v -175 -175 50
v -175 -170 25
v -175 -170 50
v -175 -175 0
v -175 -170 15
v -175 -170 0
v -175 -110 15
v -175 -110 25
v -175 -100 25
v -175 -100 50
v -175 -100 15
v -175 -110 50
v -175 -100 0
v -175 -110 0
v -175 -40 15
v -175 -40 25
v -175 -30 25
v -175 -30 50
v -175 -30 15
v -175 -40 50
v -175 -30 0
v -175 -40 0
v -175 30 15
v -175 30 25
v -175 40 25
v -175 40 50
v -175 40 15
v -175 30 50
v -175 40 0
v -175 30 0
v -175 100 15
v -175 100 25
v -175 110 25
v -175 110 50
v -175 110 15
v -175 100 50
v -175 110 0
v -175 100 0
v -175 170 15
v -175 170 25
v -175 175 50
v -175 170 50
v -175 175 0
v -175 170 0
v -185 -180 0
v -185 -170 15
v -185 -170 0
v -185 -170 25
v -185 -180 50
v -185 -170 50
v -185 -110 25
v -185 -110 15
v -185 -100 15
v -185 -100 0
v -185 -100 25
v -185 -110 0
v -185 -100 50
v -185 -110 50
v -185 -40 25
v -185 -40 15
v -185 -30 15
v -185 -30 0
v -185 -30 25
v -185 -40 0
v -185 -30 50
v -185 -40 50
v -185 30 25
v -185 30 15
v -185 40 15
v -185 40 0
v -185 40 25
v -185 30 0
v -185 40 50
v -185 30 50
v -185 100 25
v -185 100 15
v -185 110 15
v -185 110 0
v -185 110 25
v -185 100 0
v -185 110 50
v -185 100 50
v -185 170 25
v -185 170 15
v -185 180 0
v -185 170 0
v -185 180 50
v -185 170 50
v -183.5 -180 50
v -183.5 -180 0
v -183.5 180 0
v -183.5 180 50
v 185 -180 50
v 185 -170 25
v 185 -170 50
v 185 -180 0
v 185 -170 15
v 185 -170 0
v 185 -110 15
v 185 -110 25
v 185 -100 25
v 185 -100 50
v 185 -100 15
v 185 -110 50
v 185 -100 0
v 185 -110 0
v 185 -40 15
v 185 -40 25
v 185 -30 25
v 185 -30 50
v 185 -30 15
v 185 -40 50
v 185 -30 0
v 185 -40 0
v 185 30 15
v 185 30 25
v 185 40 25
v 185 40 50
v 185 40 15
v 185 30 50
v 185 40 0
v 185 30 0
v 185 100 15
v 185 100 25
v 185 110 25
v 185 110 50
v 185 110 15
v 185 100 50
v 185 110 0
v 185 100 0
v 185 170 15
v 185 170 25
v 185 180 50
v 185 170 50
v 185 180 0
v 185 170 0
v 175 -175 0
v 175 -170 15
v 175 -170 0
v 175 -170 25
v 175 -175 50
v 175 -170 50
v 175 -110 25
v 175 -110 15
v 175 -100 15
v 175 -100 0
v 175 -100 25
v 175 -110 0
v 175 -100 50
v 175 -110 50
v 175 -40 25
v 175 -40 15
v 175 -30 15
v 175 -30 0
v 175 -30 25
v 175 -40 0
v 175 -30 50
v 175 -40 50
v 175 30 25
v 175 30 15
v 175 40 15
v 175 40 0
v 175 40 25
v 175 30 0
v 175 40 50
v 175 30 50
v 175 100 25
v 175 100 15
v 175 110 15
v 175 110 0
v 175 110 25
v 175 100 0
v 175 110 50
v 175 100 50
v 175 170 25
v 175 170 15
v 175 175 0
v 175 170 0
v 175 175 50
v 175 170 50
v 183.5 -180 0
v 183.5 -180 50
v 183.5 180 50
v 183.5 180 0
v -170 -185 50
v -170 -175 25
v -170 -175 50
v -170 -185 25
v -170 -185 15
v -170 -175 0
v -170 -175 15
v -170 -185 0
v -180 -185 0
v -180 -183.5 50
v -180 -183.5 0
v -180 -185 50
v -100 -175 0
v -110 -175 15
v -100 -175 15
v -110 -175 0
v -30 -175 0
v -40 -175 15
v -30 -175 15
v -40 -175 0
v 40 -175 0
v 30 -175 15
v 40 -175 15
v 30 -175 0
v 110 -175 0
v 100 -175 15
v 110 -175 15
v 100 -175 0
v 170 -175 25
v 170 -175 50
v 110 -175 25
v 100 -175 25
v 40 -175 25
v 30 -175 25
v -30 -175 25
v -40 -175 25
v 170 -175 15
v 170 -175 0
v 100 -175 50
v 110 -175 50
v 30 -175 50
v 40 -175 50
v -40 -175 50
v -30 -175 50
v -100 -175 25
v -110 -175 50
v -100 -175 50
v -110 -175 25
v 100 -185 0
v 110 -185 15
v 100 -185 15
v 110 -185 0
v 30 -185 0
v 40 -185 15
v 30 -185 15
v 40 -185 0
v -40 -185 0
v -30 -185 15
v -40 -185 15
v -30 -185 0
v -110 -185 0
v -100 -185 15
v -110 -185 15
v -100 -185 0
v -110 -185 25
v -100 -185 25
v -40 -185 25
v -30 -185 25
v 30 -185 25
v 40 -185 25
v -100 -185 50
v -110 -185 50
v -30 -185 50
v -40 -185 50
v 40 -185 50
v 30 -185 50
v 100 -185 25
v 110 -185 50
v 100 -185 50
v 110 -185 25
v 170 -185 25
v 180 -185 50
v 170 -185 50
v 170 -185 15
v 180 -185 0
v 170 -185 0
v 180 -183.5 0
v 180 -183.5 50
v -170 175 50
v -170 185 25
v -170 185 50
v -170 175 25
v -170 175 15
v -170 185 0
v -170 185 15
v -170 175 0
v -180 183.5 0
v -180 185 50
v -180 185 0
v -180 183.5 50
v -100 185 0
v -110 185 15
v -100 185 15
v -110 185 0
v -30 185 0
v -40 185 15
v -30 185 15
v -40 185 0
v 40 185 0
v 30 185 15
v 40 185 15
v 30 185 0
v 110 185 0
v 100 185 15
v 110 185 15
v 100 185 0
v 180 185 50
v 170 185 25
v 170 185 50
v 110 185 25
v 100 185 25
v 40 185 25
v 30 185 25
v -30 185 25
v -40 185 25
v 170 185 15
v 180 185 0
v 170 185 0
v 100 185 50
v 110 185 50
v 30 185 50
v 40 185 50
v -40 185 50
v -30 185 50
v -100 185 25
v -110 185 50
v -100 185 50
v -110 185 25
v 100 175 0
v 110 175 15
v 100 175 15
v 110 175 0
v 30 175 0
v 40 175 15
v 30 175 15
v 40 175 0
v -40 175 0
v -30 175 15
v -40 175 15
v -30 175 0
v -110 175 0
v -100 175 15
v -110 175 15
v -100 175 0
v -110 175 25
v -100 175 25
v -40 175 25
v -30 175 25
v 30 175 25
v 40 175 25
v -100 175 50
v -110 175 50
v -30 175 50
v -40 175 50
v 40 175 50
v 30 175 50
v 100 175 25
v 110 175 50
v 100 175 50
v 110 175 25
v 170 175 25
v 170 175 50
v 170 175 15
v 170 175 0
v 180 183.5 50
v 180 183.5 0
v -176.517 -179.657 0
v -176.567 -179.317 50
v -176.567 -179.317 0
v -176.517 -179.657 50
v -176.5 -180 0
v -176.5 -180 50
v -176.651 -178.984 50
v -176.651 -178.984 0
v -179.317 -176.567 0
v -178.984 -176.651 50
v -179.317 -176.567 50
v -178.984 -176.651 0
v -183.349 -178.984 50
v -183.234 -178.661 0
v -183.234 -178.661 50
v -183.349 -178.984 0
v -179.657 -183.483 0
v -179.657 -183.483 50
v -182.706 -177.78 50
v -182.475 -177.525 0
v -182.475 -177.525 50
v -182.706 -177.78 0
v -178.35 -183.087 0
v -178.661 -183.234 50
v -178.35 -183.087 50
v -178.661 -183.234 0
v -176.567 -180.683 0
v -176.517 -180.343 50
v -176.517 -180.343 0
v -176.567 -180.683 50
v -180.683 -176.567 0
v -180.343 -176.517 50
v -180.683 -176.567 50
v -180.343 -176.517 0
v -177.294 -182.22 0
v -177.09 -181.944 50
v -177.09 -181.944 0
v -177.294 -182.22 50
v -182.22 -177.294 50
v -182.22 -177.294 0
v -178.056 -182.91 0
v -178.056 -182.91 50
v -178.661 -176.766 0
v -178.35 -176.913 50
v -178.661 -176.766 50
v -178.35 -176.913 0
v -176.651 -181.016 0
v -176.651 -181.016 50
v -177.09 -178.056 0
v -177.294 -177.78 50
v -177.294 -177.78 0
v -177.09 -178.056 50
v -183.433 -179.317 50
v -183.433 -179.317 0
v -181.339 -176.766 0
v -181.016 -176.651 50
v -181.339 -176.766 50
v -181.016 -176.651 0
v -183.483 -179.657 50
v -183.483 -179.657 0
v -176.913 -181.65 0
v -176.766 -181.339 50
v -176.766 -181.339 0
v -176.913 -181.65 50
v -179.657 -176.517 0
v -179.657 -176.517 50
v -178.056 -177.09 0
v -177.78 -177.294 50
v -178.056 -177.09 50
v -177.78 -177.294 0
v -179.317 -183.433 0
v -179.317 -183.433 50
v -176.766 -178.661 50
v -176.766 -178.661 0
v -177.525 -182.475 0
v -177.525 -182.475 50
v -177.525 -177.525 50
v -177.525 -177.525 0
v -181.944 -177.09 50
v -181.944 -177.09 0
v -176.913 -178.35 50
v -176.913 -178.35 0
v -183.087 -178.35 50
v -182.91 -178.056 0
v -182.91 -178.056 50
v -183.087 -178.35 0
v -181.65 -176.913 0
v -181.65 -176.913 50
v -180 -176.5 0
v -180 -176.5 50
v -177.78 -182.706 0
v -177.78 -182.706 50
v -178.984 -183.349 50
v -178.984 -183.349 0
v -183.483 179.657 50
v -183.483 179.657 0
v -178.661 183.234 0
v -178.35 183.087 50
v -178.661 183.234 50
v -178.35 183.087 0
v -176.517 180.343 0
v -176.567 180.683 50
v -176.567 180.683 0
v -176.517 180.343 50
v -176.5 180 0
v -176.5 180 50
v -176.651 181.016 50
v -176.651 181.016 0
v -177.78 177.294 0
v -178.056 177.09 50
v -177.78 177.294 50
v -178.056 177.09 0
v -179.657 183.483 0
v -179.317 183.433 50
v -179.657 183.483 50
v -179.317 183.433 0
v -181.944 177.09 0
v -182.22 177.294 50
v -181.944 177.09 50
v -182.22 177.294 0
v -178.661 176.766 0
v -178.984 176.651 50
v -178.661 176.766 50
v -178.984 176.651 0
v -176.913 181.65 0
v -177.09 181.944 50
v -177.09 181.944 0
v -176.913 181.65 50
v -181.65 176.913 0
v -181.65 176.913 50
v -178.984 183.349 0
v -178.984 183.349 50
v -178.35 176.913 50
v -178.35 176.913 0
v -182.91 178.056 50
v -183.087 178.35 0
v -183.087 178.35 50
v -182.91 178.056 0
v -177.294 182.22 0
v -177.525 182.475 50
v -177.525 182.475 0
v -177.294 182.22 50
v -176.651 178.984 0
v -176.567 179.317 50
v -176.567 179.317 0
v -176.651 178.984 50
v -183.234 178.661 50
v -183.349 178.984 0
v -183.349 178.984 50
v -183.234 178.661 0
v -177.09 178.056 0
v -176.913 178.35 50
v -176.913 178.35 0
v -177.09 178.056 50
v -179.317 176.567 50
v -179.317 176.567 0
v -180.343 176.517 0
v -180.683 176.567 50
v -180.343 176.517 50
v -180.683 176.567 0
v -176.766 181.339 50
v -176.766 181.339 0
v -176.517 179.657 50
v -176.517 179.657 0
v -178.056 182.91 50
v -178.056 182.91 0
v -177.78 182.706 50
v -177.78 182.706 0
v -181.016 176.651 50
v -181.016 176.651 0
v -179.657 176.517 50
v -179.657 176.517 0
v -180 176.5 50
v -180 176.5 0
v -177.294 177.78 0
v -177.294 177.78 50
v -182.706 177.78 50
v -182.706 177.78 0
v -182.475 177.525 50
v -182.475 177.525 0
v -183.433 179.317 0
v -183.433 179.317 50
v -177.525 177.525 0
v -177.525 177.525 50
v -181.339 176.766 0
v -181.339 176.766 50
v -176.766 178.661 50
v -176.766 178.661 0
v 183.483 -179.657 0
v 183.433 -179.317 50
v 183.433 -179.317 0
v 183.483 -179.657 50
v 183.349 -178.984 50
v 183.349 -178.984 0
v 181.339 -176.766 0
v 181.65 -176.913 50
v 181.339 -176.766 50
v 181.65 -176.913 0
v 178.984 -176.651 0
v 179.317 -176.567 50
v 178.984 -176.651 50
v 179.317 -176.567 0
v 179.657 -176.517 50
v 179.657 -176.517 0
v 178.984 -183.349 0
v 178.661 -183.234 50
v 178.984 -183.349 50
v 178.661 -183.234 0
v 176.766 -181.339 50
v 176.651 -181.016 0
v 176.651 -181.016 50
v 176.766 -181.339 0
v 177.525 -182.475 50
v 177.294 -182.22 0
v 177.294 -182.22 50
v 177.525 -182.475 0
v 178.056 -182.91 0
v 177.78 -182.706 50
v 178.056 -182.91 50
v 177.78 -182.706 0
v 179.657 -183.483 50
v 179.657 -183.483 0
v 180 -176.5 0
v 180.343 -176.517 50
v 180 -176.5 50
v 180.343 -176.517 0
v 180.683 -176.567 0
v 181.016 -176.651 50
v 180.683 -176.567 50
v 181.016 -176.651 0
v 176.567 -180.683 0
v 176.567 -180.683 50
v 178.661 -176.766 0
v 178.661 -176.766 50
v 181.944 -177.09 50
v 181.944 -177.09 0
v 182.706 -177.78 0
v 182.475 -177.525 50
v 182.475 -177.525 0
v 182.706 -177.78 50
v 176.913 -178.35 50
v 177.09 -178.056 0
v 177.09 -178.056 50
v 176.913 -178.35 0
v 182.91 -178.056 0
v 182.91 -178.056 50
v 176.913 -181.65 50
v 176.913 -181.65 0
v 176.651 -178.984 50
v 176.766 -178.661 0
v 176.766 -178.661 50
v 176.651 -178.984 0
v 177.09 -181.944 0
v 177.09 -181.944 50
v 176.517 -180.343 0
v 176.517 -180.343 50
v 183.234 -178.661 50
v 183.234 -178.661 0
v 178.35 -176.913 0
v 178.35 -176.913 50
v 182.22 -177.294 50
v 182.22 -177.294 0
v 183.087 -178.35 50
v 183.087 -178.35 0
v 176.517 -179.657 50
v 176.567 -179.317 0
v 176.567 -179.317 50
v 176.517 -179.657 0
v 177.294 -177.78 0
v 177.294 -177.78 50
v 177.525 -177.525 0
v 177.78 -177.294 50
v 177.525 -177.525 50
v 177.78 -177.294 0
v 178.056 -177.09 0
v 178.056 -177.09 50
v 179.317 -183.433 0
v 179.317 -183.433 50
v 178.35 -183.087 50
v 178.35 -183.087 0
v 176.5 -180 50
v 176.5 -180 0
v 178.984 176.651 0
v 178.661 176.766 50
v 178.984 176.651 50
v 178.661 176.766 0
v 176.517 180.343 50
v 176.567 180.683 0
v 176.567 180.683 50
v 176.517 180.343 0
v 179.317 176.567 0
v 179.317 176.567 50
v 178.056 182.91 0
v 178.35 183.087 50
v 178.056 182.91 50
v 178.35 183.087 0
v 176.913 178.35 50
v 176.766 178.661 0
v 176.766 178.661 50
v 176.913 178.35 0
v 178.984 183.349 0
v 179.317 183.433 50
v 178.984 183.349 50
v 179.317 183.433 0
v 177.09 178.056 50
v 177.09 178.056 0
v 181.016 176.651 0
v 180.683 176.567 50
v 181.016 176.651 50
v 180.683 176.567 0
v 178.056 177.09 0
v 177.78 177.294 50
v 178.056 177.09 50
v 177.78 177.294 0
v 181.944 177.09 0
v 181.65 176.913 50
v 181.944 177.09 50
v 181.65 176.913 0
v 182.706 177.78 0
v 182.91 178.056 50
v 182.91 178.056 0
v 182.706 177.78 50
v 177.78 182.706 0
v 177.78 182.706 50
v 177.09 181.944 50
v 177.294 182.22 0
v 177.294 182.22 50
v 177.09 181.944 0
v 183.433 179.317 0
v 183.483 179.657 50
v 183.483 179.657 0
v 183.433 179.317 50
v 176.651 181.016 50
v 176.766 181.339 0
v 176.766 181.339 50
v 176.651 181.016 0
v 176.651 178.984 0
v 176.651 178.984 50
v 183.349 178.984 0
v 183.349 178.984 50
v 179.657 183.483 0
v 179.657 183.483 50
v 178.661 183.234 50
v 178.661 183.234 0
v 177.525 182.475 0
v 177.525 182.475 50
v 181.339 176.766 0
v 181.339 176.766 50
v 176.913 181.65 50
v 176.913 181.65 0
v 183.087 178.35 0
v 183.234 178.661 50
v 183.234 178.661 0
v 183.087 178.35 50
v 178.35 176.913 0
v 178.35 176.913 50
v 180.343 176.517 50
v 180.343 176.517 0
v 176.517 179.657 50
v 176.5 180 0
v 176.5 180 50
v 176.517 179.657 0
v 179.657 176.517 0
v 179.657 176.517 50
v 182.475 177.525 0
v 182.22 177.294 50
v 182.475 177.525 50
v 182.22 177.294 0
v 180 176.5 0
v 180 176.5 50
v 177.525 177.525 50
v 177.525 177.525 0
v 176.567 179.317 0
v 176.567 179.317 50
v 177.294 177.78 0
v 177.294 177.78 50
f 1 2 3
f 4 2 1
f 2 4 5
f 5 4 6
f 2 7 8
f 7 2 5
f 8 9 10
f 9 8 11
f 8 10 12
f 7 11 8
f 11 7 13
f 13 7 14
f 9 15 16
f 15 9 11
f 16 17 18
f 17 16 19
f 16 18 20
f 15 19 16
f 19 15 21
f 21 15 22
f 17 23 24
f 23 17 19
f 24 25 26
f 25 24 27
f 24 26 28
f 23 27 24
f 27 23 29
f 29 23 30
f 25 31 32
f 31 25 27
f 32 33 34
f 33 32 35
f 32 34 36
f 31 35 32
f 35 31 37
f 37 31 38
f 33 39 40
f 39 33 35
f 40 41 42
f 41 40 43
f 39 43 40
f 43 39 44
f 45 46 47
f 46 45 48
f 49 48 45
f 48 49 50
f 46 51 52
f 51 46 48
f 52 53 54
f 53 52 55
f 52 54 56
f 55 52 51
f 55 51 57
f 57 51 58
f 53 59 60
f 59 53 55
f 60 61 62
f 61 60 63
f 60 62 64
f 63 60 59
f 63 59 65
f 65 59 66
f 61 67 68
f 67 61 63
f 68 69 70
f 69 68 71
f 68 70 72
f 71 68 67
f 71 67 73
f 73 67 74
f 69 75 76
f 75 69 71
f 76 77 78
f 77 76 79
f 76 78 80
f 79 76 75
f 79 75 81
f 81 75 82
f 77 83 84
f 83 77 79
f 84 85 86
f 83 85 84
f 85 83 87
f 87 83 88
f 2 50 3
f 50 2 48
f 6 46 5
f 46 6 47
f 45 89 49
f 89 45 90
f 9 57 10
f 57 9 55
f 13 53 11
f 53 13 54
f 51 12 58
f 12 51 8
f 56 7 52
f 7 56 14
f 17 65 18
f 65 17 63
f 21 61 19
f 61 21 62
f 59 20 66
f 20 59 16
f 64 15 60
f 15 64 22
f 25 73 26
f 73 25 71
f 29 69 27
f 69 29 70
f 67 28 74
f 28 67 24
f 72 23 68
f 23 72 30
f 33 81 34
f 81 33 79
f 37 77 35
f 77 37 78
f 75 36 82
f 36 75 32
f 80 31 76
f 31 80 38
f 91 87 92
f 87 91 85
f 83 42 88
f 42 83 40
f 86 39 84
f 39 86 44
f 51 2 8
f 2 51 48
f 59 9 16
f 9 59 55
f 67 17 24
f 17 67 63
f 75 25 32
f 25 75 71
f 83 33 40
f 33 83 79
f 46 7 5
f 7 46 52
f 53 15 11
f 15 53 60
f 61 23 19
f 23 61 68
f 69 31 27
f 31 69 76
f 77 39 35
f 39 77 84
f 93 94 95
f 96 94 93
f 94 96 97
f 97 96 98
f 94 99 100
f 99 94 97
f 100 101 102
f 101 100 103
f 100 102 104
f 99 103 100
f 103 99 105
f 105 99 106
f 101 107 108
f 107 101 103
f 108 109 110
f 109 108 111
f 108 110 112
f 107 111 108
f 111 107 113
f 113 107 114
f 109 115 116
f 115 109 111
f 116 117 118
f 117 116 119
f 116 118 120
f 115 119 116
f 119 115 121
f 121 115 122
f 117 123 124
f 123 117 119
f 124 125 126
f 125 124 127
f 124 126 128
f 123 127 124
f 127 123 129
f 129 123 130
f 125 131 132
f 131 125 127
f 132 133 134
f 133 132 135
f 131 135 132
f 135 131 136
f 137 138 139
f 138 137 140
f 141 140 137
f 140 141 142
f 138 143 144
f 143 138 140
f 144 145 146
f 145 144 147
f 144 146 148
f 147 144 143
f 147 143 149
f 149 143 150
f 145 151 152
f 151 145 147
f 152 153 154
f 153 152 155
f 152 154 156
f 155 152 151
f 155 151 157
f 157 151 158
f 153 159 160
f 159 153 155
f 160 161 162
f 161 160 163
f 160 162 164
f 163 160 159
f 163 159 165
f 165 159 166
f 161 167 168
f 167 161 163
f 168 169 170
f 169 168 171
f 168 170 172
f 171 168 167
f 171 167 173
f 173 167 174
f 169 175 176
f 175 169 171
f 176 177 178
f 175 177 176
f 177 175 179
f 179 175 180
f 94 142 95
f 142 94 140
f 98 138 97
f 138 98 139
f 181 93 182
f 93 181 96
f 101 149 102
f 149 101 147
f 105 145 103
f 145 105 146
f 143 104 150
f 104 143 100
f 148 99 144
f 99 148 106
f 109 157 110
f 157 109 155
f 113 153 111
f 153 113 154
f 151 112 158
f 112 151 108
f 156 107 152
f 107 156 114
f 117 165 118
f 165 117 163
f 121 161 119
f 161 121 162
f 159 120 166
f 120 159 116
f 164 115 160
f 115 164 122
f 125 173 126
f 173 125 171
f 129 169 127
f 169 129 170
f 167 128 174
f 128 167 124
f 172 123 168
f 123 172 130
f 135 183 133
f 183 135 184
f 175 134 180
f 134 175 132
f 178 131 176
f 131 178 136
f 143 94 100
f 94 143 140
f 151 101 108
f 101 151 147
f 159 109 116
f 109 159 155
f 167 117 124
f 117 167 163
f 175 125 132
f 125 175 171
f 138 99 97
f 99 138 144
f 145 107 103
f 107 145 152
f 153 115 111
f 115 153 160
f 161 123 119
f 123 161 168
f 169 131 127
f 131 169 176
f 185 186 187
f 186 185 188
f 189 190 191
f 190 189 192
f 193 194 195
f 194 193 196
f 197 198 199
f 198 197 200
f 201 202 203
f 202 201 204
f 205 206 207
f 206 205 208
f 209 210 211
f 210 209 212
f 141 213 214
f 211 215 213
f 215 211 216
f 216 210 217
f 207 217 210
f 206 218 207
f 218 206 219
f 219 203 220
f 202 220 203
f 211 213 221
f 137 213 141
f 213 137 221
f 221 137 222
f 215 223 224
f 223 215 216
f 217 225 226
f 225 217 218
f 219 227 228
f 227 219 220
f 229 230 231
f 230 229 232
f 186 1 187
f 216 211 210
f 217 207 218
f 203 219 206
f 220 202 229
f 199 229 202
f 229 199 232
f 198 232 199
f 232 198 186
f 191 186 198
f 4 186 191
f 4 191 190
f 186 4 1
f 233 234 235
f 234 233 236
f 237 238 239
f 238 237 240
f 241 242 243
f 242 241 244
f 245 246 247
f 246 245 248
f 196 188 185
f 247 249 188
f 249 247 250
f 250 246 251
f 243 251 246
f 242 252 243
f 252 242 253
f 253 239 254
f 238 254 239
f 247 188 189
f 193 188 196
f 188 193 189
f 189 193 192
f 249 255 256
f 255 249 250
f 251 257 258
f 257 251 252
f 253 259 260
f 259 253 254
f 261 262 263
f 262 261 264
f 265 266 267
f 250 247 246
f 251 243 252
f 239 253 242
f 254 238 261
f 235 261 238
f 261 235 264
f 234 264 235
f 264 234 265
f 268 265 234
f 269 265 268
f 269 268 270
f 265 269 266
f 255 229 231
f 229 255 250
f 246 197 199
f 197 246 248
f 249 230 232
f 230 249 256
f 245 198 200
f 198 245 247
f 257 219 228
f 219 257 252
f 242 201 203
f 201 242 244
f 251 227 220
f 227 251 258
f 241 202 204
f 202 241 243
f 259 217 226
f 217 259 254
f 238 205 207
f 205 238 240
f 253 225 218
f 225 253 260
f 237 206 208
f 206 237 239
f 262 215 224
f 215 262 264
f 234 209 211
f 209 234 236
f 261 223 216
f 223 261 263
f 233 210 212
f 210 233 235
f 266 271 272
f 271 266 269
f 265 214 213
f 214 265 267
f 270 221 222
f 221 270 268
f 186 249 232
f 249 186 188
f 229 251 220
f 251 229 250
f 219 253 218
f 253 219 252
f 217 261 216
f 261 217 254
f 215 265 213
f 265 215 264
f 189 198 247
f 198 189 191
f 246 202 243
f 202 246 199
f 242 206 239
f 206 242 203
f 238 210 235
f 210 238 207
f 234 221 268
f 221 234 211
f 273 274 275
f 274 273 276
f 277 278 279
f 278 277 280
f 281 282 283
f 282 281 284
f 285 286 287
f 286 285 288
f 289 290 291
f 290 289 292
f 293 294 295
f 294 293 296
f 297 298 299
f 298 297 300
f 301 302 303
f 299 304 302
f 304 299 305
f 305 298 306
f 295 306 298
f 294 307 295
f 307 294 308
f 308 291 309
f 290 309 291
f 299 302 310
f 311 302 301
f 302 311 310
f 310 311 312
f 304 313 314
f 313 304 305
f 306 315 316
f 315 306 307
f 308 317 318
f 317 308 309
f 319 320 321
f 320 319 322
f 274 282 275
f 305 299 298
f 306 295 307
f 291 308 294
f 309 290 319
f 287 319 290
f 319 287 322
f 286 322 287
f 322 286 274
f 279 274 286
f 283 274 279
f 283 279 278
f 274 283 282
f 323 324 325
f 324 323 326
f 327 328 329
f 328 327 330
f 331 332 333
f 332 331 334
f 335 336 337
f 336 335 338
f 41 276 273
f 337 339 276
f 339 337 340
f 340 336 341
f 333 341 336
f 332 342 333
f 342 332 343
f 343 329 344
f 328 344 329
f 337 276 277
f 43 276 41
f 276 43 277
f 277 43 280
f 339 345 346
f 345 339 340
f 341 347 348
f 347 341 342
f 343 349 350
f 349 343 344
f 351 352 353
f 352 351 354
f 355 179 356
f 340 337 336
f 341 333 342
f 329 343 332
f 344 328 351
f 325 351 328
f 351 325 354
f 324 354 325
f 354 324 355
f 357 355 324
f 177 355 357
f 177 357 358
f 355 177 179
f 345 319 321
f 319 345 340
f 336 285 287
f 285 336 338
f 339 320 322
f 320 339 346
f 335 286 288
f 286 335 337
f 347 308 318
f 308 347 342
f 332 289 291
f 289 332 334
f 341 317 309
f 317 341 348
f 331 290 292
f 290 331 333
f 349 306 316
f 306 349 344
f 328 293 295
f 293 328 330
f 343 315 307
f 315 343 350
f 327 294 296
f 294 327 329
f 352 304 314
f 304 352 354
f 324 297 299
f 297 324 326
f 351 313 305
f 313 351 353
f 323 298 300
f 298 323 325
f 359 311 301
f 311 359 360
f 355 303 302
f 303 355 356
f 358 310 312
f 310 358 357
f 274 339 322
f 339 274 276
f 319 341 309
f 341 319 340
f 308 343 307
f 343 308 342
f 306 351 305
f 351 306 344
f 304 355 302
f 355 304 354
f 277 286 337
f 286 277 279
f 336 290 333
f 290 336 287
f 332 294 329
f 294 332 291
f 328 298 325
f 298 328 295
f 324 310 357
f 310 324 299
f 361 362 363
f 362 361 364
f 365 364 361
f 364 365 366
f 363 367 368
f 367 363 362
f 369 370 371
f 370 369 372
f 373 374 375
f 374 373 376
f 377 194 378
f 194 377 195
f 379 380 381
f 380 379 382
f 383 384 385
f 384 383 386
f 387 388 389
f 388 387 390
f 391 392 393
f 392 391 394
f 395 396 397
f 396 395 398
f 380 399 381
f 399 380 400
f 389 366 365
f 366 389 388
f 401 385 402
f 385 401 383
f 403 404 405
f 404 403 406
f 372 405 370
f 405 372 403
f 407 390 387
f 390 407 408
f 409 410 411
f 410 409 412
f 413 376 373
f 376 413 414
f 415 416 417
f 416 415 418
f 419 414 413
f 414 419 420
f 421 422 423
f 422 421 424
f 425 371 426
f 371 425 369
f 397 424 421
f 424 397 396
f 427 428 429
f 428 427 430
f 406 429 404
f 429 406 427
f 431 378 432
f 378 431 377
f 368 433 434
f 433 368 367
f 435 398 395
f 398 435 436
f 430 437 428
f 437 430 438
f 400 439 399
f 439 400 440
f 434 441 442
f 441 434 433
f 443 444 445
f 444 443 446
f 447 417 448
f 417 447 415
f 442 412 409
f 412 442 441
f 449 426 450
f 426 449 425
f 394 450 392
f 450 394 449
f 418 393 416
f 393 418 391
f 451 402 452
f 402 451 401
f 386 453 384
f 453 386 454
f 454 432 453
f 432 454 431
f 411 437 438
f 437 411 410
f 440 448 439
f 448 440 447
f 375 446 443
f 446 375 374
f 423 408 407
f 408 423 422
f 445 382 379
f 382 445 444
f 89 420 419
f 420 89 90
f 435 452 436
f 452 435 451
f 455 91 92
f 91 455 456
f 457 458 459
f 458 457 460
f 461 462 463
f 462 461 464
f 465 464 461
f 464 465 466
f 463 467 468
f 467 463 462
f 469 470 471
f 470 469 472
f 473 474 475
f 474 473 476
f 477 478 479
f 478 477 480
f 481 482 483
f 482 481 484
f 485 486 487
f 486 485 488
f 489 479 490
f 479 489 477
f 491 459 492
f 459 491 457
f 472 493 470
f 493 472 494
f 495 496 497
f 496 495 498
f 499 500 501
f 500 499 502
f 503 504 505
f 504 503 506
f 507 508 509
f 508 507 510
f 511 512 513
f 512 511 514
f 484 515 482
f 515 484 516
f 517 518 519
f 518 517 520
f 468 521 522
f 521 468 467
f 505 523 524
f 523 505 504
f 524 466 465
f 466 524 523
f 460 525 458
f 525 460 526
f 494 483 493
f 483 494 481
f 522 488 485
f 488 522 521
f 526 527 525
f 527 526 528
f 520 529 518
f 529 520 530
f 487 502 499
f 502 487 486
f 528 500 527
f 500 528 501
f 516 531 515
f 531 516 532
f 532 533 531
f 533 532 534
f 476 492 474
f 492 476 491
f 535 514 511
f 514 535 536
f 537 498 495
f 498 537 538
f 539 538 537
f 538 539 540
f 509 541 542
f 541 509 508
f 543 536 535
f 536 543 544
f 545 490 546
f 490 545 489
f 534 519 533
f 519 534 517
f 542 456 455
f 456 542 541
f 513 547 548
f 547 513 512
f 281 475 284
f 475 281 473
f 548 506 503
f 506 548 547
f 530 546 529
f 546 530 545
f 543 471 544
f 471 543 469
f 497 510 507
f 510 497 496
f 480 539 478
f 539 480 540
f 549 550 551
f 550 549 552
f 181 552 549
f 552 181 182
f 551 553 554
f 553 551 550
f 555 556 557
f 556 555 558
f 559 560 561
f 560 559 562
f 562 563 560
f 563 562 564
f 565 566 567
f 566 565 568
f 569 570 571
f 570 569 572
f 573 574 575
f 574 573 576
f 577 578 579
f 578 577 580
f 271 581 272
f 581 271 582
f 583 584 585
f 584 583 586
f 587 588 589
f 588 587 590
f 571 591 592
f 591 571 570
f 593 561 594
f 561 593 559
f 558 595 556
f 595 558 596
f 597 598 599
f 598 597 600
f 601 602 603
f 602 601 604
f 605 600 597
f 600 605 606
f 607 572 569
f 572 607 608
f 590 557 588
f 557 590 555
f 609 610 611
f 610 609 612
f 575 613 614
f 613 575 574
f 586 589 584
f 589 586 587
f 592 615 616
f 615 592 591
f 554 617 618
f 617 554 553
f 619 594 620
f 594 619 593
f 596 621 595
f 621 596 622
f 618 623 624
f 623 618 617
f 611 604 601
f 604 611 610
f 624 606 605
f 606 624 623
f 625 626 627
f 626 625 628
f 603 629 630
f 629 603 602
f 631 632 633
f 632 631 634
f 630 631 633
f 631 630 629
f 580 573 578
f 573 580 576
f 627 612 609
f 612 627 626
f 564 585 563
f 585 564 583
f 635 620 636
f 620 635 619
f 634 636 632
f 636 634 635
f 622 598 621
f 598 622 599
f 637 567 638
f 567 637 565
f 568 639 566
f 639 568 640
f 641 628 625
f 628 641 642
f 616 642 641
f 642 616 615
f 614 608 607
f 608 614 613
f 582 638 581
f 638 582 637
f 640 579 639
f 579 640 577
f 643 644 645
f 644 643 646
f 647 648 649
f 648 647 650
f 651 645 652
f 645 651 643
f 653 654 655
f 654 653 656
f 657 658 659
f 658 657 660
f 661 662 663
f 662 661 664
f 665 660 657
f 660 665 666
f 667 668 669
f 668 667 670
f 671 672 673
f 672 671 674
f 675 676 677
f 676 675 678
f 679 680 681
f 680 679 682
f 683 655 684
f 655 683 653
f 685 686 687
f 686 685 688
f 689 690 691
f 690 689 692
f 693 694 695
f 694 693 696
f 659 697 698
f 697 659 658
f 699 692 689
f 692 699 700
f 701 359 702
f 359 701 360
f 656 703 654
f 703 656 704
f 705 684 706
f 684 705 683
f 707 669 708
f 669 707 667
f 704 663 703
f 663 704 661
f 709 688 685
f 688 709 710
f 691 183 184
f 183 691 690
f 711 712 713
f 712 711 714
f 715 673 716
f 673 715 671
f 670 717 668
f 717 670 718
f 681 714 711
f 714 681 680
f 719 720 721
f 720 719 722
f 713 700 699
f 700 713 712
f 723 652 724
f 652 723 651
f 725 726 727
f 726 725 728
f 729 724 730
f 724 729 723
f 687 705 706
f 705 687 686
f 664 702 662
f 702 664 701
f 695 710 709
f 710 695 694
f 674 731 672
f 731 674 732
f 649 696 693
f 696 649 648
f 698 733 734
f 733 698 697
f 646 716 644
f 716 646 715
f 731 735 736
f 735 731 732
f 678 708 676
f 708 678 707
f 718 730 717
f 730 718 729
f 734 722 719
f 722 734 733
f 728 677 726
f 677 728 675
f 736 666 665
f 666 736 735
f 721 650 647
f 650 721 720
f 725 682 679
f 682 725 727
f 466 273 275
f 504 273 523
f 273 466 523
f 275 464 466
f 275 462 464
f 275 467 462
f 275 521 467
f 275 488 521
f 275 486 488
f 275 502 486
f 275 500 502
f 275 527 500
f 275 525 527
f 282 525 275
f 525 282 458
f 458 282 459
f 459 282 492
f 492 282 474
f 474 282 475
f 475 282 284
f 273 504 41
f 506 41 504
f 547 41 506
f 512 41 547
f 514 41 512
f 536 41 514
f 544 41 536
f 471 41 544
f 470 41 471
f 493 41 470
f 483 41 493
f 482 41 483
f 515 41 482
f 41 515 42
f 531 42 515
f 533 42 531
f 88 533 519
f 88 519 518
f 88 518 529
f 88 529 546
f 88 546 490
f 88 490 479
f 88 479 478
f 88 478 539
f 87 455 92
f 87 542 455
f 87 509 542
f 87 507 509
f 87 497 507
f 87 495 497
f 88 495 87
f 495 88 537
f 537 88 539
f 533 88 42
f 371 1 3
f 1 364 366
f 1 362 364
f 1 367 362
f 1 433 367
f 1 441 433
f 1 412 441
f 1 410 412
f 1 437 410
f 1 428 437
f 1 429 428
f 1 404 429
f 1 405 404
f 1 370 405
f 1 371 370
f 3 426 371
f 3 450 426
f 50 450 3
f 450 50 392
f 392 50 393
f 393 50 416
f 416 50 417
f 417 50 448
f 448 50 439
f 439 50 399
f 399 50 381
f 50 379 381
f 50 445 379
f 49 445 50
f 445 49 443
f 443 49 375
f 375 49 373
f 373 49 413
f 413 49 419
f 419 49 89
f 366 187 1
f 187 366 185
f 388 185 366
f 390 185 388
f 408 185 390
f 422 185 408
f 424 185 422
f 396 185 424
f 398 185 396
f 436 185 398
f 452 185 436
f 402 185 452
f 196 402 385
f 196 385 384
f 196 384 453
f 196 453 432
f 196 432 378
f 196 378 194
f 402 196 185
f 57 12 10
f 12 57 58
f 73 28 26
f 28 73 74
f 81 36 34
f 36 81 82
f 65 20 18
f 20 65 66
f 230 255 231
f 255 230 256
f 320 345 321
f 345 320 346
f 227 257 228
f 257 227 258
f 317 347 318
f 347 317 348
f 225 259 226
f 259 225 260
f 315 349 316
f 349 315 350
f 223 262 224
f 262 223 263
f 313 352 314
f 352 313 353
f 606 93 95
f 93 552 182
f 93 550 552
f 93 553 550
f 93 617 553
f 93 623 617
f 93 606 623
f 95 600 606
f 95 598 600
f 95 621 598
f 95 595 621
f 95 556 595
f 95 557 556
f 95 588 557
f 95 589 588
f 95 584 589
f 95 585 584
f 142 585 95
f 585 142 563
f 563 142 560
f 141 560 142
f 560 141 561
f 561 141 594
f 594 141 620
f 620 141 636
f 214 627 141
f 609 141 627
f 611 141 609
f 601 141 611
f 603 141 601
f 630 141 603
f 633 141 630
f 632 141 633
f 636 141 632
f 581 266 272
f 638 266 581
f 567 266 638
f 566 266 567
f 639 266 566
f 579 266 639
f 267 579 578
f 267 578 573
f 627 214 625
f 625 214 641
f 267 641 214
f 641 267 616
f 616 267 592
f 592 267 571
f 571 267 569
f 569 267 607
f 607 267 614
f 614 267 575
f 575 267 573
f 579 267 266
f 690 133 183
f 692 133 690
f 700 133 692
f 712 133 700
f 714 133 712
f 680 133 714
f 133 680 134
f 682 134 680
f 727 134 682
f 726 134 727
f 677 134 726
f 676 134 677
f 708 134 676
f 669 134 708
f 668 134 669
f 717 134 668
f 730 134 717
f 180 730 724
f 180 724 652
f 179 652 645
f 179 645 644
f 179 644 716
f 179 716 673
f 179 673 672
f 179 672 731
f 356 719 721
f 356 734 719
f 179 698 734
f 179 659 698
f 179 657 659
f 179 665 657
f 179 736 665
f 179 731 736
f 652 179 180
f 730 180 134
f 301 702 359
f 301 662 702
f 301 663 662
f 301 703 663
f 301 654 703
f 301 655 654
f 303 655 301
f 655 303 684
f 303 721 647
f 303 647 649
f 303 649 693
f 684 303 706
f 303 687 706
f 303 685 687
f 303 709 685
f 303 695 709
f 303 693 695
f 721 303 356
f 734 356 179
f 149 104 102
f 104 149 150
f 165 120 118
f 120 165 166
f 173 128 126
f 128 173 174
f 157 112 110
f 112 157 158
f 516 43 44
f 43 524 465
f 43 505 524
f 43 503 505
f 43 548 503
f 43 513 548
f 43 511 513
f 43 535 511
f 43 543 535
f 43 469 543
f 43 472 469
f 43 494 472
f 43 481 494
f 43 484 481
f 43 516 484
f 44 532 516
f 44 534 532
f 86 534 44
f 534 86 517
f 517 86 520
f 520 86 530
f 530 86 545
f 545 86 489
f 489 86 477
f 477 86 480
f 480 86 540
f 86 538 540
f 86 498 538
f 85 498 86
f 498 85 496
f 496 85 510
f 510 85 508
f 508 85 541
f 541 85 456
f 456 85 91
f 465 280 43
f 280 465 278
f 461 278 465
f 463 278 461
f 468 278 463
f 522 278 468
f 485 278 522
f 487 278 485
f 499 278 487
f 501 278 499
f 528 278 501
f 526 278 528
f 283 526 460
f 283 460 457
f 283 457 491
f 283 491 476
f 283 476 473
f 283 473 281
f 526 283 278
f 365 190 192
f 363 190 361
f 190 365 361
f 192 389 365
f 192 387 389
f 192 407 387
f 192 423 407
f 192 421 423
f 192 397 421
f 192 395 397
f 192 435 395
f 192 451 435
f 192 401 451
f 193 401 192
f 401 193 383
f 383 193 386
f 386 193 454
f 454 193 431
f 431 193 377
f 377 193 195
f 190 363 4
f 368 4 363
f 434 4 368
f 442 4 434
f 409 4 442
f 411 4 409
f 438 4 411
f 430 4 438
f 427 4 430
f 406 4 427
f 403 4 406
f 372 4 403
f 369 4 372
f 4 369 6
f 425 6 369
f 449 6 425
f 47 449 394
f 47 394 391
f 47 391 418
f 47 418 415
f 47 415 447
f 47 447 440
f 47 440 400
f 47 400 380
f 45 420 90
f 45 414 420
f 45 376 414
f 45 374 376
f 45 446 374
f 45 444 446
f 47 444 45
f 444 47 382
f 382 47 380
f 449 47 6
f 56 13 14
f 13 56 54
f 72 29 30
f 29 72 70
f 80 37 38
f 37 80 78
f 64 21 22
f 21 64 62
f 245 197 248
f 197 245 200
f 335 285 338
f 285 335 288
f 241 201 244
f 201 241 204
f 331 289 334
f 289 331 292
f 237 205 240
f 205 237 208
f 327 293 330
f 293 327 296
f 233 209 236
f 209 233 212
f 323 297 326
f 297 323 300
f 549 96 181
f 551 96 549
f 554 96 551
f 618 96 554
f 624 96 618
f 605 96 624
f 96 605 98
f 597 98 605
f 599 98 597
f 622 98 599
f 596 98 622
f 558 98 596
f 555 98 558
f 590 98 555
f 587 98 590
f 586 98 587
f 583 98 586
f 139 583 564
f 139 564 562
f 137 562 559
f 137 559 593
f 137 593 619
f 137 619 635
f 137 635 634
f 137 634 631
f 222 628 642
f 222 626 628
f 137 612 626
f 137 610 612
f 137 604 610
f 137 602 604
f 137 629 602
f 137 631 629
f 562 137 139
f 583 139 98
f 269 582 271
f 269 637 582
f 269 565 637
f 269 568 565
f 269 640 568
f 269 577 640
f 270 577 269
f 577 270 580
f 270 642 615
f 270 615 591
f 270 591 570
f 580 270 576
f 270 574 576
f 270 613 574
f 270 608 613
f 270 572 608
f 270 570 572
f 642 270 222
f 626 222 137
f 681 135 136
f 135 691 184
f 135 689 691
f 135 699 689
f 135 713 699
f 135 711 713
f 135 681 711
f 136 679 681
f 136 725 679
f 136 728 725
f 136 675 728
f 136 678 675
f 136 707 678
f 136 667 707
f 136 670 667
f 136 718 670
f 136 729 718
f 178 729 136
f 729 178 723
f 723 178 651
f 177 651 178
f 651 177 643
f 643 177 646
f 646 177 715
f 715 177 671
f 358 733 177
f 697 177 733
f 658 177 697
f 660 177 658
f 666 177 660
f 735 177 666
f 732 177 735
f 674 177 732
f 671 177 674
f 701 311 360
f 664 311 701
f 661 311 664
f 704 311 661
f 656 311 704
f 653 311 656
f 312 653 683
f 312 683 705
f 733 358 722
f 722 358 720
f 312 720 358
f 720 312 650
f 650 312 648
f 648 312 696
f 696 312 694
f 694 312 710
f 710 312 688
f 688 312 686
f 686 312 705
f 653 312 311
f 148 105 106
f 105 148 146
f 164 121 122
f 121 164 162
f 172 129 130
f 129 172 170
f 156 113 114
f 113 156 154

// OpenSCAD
/*
  Cage slice 05 of 15
*/

bar = 10;
half_inner = 175;
gap = 70;
rod_d = 7;
half_outer = half_inner + bar;

function grid_pos(n) = -half_inner + n * gap;

module cage_full() {
  difference() {
    union() {
      // Floor grid at z = -10 .. 0
      for (j = [0:5]) {
        y = grid_pos(j);
        translate([-half_inner, y - bar/2, -bar])
          cube([2*half_inner, bar, bar], center=false);
      }
      for (i = [0:5]) {
        x = grid_pos(i);
        translate([x - bar/2, -half_inner, -bar])
          cube([bar, 2*half_inner, bar], center=false);
      }

      // Roof grid at z = 700 .. 710
      for (j = [0:5]) {
        y = grid_pos(j);
        translate([-half_inner, y - bar/2, 700])
          cube([2*half_inner, bar, bar], center=false);
      }
      for (i = [0:5]) {
        x = grid_pos(i);
        translate([x - bar/2, -half_inner, 700])
          cube([bar, 2*half_inner, bar], center=false);
      }

      // Side walls at x = ±175
      for (side = [-1, 1]) {
        sx = side * half_inner;
        x0 = (side == 1) ? sx : sx - bar;
        for (j = [0:5]) {
          y = grid_pos(j);
          translate([x0, y - bar/2, 0])
            cube([bar, bar, 700], center=false);
        }
        for (k = [0:10]) {
          zc = 0 + k * gap;
          translate([x0, -half_inner, zc - bar/2])
            cube([bar, 2*half_inner, bar], center=false);
        }
      }

      // Front/back walls at y = ±175
      for (side = [-1, 1]) {
        sy = side * half_inner;
        y0 = (side == 1) ? sy : sy - bar;
        for (i = [0:5]) {
          x = grid_pos(i);
          translate([x - bar/2, y0, 0])
            cube([bar, bar, 700], center=false);
        }
        for (k = [0:10]) {
          zc = 0 + k * gap;
          translate([-half_inner, y0, zc - bar/2])
            cube([2*half_inner, bar, bar], center=false);
        }
      }
    }

    for (sx = [-1, 1], sy = [-1, 1]) {
      translate([sx * (half_inner + bar/2),
                 sy * (half_inner + bar/2),
                 -20])
        cylinder(d = rod_d, h = 740, $fn = 64);
    }
  }
}

z_min = 190;
z_max = 240;  // height 50 mm

module slice() {
  intersection() {
    cage_full();
    translate([-half_outer - 5, -half_outer - 5, z_min])
      cube([2*(half_outer + 5), 2*(half_outer + 5), z_max - z_min], center=false);
  }
}

translate([0, 0, -z_min])
  slice();
